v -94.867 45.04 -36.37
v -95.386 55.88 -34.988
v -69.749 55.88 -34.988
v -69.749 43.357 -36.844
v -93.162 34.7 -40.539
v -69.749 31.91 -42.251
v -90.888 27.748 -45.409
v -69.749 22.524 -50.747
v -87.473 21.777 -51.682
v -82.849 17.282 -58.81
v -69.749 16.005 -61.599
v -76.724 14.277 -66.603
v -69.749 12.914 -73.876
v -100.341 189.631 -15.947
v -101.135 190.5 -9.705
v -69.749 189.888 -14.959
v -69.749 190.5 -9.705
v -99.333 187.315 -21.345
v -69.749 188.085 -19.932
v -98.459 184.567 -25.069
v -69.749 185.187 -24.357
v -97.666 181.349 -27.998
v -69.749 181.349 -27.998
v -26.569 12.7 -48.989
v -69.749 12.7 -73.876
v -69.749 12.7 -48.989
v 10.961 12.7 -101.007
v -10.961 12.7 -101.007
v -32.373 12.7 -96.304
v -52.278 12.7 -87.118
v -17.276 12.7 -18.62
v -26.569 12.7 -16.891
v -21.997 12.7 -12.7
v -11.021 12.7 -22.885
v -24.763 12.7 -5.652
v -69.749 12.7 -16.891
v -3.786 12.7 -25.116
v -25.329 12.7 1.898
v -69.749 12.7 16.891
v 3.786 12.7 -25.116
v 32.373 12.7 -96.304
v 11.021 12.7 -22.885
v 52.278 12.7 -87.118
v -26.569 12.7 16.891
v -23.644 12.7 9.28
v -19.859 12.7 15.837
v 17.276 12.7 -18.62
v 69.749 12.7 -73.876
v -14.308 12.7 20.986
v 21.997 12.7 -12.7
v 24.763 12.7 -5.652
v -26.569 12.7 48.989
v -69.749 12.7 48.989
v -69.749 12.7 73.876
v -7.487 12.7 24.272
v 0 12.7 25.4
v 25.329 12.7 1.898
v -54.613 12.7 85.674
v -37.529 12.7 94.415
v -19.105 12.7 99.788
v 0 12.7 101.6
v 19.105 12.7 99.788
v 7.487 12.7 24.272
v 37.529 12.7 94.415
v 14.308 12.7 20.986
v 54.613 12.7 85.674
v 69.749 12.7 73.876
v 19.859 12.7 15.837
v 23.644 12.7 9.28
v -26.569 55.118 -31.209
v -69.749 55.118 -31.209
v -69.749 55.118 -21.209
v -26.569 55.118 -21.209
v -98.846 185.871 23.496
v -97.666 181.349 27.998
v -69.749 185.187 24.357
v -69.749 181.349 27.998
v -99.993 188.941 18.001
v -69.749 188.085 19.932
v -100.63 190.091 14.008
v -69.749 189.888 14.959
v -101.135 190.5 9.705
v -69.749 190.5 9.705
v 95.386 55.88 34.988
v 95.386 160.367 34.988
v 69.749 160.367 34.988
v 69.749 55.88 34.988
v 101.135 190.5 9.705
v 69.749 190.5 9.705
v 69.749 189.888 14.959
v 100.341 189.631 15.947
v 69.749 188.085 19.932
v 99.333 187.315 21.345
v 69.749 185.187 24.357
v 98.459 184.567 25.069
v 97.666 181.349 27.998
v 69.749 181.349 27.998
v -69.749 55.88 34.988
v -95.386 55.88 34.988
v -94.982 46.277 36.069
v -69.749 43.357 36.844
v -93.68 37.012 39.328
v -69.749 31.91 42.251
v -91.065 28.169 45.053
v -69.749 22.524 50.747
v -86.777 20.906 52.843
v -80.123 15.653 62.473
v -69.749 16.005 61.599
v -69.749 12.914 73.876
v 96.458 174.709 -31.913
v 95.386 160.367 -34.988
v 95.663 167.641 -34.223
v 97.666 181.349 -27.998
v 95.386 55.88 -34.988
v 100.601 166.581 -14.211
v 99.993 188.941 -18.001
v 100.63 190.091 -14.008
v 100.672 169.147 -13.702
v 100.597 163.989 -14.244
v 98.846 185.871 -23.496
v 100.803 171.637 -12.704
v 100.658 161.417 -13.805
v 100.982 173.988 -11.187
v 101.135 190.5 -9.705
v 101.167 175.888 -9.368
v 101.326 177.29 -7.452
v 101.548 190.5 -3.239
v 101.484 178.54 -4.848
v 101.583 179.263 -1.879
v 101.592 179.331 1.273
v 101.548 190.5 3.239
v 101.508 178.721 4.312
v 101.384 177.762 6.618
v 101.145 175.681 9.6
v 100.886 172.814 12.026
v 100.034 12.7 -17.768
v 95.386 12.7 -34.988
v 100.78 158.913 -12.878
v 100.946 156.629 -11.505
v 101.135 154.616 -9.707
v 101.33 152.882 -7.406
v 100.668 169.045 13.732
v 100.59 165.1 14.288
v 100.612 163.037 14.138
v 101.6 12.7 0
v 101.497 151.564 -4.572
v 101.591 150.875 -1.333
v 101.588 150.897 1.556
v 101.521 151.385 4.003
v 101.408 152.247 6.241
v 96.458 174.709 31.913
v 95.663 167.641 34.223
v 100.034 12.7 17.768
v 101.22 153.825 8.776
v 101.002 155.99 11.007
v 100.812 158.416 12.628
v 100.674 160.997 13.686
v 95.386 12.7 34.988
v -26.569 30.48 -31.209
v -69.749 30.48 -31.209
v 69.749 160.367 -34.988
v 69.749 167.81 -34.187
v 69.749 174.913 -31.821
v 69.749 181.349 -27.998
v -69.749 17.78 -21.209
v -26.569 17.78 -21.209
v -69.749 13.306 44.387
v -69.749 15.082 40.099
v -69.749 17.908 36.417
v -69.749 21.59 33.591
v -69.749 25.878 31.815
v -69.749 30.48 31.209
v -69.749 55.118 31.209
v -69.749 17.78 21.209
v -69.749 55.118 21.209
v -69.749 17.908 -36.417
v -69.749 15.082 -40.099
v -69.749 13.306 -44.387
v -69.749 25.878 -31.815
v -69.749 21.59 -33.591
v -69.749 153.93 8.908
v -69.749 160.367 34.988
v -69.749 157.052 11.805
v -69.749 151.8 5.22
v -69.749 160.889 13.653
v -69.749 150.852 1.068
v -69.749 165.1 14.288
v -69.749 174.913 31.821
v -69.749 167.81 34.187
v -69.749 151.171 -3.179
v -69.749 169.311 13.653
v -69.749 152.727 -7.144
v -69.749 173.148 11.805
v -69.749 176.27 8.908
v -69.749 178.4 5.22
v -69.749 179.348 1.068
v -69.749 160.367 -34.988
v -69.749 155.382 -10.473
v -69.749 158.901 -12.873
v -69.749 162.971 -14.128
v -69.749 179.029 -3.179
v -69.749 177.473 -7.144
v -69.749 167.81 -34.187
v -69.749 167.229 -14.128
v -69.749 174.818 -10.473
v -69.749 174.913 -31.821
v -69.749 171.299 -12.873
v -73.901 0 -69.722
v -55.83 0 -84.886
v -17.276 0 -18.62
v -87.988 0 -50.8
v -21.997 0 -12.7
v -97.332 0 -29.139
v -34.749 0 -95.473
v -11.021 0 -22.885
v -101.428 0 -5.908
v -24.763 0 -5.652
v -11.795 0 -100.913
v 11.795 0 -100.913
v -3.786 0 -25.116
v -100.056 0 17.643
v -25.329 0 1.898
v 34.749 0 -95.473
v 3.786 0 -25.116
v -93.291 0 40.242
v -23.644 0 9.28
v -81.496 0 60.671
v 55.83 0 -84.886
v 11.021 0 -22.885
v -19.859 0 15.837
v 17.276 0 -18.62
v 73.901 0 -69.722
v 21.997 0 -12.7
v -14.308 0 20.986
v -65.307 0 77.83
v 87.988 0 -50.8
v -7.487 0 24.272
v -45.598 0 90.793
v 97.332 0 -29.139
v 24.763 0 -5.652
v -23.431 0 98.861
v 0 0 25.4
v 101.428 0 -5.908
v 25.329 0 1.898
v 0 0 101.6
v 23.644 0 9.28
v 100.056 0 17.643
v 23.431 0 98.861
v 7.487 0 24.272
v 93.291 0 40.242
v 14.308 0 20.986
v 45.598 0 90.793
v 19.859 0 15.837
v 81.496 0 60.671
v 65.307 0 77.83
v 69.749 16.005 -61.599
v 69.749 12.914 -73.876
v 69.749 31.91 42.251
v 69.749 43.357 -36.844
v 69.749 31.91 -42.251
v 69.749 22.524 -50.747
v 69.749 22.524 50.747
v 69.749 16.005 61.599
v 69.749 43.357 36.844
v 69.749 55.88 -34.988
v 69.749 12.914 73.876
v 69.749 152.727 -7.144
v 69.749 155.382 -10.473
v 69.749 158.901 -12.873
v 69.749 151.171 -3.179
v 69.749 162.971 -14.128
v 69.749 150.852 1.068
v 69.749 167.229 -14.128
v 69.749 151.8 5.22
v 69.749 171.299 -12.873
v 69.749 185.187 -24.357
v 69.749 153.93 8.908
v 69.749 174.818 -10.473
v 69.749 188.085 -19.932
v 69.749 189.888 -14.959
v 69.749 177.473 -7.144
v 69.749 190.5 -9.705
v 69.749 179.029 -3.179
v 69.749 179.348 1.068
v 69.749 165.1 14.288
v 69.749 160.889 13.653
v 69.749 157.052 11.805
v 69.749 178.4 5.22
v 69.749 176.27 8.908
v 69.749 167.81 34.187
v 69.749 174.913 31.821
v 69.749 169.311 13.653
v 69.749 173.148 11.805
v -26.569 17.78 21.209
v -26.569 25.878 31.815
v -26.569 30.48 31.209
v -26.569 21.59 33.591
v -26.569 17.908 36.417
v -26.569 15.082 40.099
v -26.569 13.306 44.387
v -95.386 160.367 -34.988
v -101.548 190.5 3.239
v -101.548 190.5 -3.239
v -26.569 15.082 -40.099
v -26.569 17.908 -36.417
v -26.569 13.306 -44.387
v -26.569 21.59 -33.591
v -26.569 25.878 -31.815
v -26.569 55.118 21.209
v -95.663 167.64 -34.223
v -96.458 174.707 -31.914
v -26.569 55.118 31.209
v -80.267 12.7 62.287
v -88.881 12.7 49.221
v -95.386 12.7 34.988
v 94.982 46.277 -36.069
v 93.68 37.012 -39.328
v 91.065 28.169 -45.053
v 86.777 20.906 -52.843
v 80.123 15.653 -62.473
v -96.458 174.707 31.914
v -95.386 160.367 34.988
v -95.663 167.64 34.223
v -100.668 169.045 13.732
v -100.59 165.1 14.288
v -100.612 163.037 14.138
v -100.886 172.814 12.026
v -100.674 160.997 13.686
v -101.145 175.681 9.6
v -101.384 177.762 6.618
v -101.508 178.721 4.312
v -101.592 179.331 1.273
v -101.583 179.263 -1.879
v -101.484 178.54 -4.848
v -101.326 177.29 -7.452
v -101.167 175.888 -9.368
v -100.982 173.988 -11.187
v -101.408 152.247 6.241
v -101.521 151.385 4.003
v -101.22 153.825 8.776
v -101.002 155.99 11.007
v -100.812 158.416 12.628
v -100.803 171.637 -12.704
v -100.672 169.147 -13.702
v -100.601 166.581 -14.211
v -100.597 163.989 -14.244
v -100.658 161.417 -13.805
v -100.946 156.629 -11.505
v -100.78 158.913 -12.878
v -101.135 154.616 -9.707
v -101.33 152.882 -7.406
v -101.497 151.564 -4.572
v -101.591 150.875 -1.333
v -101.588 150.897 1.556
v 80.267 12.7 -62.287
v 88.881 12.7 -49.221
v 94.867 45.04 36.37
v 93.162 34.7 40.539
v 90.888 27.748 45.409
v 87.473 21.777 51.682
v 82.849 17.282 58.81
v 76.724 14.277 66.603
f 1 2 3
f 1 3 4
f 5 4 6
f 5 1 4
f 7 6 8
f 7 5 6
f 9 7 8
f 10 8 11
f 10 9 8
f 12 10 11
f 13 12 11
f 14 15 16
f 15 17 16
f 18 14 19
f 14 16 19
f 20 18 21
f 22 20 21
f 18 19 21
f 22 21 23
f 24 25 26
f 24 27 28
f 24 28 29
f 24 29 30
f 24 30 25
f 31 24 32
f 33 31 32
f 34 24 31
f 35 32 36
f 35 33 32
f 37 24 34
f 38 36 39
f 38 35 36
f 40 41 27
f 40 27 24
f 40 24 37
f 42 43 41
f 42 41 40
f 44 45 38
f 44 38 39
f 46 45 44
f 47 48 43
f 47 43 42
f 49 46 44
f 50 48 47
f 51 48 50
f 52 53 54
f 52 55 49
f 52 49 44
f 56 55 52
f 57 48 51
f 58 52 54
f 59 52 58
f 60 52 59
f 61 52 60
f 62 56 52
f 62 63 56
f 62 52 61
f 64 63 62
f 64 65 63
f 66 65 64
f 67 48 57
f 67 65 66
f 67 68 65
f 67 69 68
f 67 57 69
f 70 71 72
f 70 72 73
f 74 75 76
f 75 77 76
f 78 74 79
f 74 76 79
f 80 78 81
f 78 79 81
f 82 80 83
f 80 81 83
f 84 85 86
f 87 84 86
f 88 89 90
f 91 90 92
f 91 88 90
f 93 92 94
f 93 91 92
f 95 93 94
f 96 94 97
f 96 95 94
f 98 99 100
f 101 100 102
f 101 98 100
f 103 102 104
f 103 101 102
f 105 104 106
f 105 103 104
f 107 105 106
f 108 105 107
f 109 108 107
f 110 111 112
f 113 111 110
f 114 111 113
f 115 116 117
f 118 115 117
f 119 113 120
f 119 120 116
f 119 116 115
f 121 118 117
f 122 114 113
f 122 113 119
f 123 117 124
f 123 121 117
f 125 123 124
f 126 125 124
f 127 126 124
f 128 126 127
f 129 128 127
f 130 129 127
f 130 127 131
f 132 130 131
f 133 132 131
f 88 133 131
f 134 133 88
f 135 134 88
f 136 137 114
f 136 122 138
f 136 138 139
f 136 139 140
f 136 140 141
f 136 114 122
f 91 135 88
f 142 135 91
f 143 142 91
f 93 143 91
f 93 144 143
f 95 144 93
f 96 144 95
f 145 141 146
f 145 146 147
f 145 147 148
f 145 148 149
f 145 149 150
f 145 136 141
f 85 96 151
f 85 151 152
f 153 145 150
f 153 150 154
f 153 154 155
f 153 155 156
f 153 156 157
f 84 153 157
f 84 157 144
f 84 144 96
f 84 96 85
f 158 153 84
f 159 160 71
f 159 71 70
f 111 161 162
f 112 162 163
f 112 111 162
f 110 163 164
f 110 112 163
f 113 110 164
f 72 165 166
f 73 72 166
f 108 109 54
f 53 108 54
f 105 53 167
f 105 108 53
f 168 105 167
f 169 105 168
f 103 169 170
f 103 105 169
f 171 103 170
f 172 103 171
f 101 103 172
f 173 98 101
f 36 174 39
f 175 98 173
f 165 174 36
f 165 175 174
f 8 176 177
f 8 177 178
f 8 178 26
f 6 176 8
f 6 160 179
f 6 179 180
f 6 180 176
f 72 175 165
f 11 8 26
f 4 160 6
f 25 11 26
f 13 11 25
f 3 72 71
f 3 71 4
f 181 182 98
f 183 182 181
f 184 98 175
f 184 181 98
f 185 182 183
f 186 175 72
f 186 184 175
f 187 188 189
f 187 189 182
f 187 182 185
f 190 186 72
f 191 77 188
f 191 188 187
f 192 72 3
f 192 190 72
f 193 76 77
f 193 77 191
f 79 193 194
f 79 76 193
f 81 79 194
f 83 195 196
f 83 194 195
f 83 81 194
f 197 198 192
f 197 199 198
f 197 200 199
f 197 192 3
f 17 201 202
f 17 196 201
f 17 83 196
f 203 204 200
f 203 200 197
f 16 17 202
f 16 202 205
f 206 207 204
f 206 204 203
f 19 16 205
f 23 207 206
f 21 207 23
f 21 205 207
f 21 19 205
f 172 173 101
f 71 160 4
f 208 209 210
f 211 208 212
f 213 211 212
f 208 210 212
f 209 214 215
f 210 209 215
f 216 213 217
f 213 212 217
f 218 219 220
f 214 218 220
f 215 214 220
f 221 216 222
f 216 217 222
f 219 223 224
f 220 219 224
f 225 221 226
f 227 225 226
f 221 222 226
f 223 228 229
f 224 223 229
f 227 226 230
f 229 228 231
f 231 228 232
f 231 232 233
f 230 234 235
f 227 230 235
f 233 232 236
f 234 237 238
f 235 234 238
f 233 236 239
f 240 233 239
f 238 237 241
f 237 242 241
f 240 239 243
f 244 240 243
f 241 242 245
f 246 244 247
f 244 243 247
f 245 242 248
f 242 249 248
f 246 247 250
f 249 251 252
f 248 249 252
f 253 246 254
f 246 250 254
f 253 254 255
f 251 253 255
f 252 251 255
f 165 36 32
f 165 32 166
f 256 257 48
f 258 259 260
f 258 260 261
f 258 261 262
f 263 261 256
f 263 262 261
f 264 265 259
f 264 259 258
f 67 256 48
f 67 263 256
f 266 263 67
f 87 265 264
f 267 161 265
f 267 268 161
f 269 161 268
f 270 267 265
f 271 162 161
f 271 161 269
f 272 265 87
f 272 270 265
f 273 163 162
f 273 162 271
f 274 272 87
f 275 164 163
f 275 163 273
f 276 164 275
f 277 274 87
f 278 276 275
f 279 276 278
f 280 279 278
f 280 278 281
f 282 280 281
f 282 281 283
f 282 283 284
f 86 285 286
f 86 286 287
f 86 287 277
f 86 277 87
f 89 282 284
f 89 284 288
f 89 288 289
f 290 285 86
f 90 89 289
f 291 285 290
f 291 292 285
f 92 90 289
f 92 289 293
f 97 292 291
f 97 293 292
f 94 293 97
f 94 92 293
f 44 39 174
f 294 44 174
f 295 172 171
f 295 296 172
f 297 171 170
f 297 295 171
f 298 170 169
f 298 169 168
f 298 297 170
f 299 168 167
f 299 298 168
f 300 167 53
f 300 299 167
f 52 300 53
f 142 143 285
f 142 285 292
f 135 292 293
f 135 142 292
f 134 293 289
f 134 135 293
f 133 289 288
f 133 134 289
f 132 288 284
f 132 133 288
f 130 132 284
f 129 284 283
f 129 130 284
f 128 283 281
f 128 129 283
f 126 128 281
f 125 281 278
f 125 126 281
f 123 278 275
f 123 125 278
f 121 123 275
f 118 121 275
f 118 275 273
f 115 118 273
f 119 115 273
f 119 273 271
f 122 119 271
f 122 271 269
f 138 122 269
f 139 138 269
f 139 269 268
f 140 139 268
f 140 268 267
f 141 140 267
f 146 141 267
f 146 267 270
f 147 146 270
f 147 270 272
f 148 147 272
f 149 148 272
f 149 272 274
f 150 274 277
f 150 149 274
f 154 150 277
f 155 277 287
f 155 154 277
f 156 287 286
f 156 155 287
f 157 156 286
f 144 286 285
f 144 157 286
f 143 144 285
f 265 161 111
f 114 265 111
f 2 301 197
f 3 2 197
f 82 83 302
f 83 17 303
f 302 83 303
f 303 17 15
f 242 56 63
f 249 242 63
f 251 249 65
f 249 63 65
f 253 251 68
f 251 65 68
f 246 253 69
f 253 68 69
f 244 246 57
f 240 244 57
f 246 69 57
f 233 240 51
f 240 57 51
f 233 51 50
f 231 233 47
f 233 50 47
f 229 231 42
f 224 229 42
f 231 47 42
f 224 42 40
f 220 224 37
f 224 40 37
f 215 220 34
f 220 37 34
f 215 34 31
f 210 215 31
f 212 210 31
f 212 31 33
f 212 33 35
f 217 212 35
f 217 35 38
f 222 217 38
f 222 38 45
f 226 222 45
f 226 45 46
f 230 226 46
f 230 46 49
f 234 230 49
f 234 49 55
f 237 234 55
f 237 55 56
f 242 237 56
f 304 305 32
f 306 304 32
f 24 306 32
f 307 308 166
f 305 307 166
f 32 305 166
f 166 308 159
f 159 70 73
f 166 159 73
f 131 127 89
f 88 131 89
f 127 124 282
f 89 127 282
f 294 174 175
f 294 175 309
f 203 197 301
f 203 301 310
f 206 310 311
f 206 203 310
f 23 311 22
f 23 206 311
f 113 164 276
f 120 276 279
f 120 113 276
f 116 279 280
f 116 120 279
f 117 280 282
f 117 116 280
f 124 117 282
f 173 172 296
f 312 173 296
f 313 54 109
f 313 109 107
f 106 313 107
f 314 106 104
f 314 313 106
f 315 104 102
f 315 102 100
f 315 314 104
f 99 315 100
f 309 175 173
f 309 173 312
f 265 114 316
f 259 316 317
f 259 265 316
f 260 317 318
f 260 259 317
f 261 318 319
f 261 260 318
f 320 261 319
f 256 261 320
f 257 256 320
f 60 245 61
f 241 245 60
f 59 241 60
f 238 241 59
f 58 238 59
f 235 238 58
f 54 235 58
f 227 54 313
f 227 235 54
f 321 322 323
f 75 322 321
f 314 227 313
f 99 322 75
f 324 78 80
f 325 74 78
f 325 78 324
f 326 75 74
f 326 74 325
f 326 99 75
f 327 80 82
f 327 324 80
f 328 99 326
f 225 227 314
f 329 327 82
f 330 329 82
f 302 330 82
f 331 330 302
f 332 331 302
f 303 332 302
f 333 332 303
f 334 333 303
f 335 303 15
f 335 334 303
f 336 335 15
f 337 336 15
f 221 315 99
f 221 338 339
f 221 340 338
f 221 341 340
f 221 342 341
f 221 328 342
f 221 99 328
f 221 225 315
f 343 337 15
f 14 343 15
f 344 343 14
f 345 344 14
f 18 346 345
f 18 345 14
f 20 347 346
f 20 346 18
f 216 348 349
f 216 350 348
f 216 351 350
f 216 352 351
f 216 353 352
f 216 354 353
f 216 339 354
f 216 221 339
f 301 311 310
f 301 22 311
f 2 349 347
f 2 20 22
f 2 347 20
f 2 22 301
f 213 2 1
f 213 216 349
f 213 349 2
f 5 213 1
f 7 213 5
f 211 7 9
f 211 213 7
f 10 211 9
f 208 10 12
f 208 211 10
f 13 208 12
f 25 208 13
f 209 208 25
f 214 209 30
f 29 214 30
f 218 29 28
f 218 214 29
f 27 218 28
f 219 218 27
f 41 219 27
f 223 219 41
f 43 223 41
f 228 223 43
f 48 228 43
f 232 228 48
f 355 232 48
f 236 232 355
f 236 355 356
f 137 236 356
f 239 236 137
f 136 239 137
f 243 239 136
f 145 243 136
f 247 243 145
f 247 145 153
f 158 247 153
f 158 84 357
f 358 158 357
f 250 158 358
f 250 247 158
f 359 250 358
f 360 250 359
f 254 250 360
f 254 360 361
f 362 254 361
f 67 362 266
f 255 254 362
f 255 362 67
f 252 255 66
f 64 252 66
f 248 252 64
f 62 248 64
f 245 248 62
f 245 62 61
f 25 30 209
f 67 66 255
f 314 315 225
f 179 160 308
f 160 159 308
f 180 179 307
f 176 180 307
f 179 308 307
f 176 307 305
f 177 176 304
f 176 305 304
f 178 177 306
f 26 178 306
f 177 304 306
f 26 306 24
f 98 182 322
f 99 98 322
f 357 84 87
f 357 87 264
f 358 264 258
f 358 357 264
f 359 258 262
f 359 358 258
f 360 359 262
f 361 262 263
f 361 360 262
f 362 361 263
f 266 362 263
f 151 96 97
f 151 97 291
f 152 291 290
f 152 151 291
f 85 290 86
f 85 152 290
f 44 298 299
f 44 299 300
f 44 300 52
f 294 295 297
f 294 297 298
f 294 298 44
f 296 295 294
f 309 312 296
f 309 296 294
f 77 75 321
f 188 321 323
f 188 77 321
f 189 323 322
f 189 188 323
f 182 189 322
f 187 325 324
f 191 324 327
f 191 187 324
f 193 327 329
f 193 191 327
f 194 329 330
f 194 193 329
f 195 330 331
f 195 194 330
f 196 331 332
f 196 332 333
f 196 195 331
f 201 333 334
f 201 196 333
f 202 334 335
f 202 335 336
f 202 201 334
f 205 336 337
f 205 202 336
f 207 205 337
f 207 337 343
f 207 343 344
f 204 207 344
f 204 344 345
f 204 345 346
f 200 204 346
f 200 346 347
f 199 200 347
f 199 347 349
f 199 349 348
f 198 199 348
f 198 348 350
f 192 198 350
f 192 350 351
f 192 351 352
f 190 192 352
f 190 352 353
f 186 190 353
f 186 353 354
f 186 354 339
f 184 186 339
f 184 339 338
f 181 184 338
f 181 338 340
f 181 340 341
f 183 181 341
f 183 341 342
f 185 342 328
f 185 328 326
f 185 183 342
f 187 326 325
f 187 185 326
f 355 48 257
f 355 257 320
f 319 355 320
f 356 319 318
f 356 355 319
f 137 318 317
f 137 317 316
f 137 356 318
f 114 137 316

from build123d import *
from build123d.topology import SkipClean

# Parameters (mm, degrees)
SKETCH1_R               = 101.6
BOSS_EXTRUDE1_DEPTH     = 12.7
BOSS_EXTRUDE3_DEPTH     = 177.8
FILLET3_R               = 43.18
SKETCH3_R               = 25.4
CUT_EXTRUDE1_DEPTH      = 229.600000167
CUT_EXTRUDE2_DEPTH      = 276.632670899
CUT_EXTRUDE2_DEPTH_BACK = 276.632670899
SKETCH4_R               = 14.2875
CUT_EXTRUDE3_DEPTH      = 276.6326709
CUT_EXTRUDE3_DEPTH_BACK = 276.6326709
FILLET4_R               = 22.86
SKETCH7_W               = 43.18
SKETCH7_H               = 10
BOSS_EXTRUDE4_DEPTH     = 42.418
BOSS_EXTRUDE5_DEPTH     = 43.18
FILLET5_R               = 17.78


with BuildPart() as part:
    # Sketch1 → Boss-Extrude1 (new body)
    with BuildSketch(Plane(origin=(0, 0, 0), x_dir=(1, 0, 0), z_dir=(0, 1, 0))):
        with Locations(Location((0, 0, 0), (0, 0, 270))):
            Circle(SKETCH1_R)
    extrude(amount=BOSS_EXTRUDE1_DEPTH)

    # Sketch2 → Boss-Extrude3 (add)
    with SkipClean():  # the faces are left unmerged after this step: merging them gives an invalid solid
        with BuildSketch(Plane(origin=(0, 12.7, 0), x_dir=(1, 0, 0), z_dir=(0, 1, 0))):
            with BuildLine():
                Line((-69.749231612, -34.987681034), (-95.385649738, -34.987681034))
                ThreePointArc((-95.385649738, -34.987681034), (-101.6, 0), (-95.385649738, 34.987681034))
                Line((-95.385649738, 34.987681034), (-69.749231612, 34.987681034))
                Line((-69.749231612, 34.987681034), (-69.749231612, -34.987681034))
            make_face()
            with BuildLine():
                Line((69.749231612, 34.987681034), (95.385649738, 34.987681034))
                ThreePointArc((95.385649738, 34.987681034), (101.6, 0), (95.385649738, -34.987681034))
                Line((95.385649738, -34.987681034), (69.749231612, -34.987681034))
                Line((69.749231612, -34.987681034), (69.749231612, 34.987681034))
            make_face()
        extrude(amount=BOSS_EXTRUDE3_DEPTH)

    # Fillet3
    # the kernel refuses this fillet: 43.18 mm, written as the material it adds along each edge
    with BuildSketch(Plane(origin=(-203.335649738, 12.7, -34.987681034), x_dir=(0, 0, -1), z_dir=(1, 0, 0))) as fillet3_piece_1_section:
        with BuildLine():
            CenterArc((FILLET3_R, FILLET3_R), FILLET3_R, 180, 90)
            Line((0, FILLET3_R), (0, 0))
            Line((0, 0), (FILLET3_R, 0))
        make_face()
    fillet3_piece_1 = extrude(amount=133.586418126, mode=Mode.PRIVATE)
    fillet3_piece_1 = fillet3_piece_1 & Plane(origin=(0, 23.799745308, 0), x_dir=(0, 0, 1), z_dir=(0, -1, 0)) * Cylinder(101.6, 440, mode=Mode.PRIVATE)
    add(fillet3_piece_1)
    with BuildSketch(Plane(origin=(203.335649738, 12.7, 34.987681034), x_dir=(0, 0, 1), z_dir=(-1, 0, 0))) as fillet3_piece_2_section:
        with BuildLine():
            CenterArc((FILLET3_R, FILLET3_R), FILLET3_R, 180, 90)
            Line((0, FILLET3_R), (0, 0))
            Line((0, 0), (FILLET3_R, 0))
        make_face()
    fillet3_piece_2 = extrude(amount=133.586418126, mode=Mode.PRIVATE)
    fillet3_piece_2 = fillet3_piece_2 & Plane(origin=(0, 23.799745308, 0), x_dir=(0, 0, 1), z_dir=(0, -1, 0)) * Cylinder(101.6, 440, mode=Mode.PRIVATE)
    add(fillet3_piece_2)
    with BuildSketch(Plane(origin=(69.749231612, 12.7, -34.987681034), x_dir=(0, 0, -1), z_dir=(1, 0, 0))) as fillet3_piece_3_section:
        with BuildLine():
            CenterArc((FILLET3_R, FILLET3_R), FILLET3_R, 180, 90)
            Line((0, FILLET3_R), (0, 0))
            Line((0, 0), (FILLET3_R, 0))
        make_face()
    fillet3_piece_3 = extrude(amount=133.586418126, mode=Mode.PRIVATE)
    fillet3_piece_3 = fillet3_piece_3 & Plane(origin=(0, 23.79973444, 0), x_dir=(0, 0, 1), z_dir=(0, -1, 0)) * Cylinder(101.6, 440, mode=Mode.PRIVATE)
    add(fillet3_piece_3)
    with BuildSketch(Plane(origin=(-69.749231612, 12.7, 34.987681034), x_dir=(0, 0, 1), z_dir=(-1, 0, 0))) as fillet3_piece_4_section:
        with BuildLine():
            CenterArc((FILLET3_R, FILLET3_R), FILLET3_R, 180, 90)
            Line((0, FILLET3_R), (0, 0))
            Line((0, 0), (FILLET3_R, 0))
        make_face()
    fillet3_piece_4 = extrude(amount=133.586418126, mode=Mode.PRIVATE)
    fillet3_piece_4 = fillet3_piece_4 & Plane(origin=(0, 23.79973444, 0), x_dir=(0, 0, 1), z_dir=(0, -1, 0)) * Cylinder(101.6, 440, mode=Mode.PRIVATE)
    add(fillet3_piece_4)

    # Sketch3 → Cut-Extrude1 (cut, through all)
    with BuildSketch(Plane(origin=(0, 12.7, 0), x_dir=(1, 0, 0), z_dir=(0, 1, 0))):
        with Locations(Location((0, 0, 0), (0, 0, 270))):
            Circle(SKETCH3_R)
    extrude(amount=-CUT_EXTRUDE1_DEPTH, mode=Mode.SUBTRACT)

    # Sketch4 → Cut-Extrude2 (cut, two sides: drawn at the far end of the back side and taken through both)
    with BuildSketch(Plane.ZY.offset(-69.749231612).offset(-CUT_EXTRUDE2_DEPTH_BACK)):
        with Locations((0, 165.1)):
            Circle(SKETCH4_R)
    extrude(amount=CUT_EXTRUDE2_DEPTH + CUT_EXTRUDE2_DEPTH_BACK, mode=Mode.SUBTRACT)

    # Sketch5 → Cut-Extrude3 (cut, two sides: drawn at the far end of the back side and taken through both)
    with BuildSketch(Plane.ZY.offset(-69.749231612).offset(-CUT_EXTRUDE3_DEPTH_BACK)):
        with BuildLine():
            Line((34.987681034, 160.366849855), (34.987681034, 209.992755937))
            Line((34.987681034, 209.992755937), (-34.987681034, 209.992755937))
            Line((-34.987681034, 209.992755937), (-34.987681034, 160.366849855))
            ThreePointArc((-34.987681034, 160.366849855), (0, 195.354530889), (34.987681034, 160.366849855))
        make_face()
    extrude(amount=CUT_EXTRUDE3_DEPTH + CUT_EXTRUDE3_DEPTH_BACK, mode=Mode.SUBTRACT)

    # Fillet4
    fillet4_edges = [part.edges().sort_by_distance(p)[0] for p in [
        (-84.890685507, 190.5, -17.780075547),
        (-84.890685507, 190.5, 17.780075547),
        (84.890685507, 190.5, -17.780075547),
        (84.890685507, 190.5, 17.780075547),
    ]]
    fillet(fillet4_edges, radius=FILLET4_R)

    # Sketch7 → Boss-Extrude4 (add)
    with BuildSketch(Plane(origin=(0, 12.7, 0), x_dir=(1, 0, 0), z_dir=(0, 1, 0))):
        with Locations((-48.159231612, 26.209)):
            Rectangle(SKETCH7_W, SKETCH7_H)
        with Locations((-48.159231612, -26.209)):
            Rectangle(SKETCH7_W, SKETCH7_H)
    extrude(amount=BOSS_EXTRUDE4_DEPTH)

    # Sketch8 → Boss-Extrude5 (add)
    with BuildSketch(Plane(origin=(-69.749231612, 0, 0), x_dir=(0, 0, -1), z_dir=(1, 0, 0))):
        Polygon((-21.209, 17.78), (-21.209, 12.7), (-16.891, 12.7), align=None)
        Polygon((16.891, 12.7), (21.209, 17.78), (21.209, 12.7), align=None)
    extrude(amount=BOSS_EXTRUDE5_DEPTH)

    # Fillet5
    fillet5_edges = [part.edges().sort_by_distance(p)[0] for p in [
        (-48.159231612, 12.7, -31.209),
        (-48.159231612, 12.7, 31.209),
    ]]
    fillet(fillet5_edges, radius=FILLET5_R)


solid = part.part
